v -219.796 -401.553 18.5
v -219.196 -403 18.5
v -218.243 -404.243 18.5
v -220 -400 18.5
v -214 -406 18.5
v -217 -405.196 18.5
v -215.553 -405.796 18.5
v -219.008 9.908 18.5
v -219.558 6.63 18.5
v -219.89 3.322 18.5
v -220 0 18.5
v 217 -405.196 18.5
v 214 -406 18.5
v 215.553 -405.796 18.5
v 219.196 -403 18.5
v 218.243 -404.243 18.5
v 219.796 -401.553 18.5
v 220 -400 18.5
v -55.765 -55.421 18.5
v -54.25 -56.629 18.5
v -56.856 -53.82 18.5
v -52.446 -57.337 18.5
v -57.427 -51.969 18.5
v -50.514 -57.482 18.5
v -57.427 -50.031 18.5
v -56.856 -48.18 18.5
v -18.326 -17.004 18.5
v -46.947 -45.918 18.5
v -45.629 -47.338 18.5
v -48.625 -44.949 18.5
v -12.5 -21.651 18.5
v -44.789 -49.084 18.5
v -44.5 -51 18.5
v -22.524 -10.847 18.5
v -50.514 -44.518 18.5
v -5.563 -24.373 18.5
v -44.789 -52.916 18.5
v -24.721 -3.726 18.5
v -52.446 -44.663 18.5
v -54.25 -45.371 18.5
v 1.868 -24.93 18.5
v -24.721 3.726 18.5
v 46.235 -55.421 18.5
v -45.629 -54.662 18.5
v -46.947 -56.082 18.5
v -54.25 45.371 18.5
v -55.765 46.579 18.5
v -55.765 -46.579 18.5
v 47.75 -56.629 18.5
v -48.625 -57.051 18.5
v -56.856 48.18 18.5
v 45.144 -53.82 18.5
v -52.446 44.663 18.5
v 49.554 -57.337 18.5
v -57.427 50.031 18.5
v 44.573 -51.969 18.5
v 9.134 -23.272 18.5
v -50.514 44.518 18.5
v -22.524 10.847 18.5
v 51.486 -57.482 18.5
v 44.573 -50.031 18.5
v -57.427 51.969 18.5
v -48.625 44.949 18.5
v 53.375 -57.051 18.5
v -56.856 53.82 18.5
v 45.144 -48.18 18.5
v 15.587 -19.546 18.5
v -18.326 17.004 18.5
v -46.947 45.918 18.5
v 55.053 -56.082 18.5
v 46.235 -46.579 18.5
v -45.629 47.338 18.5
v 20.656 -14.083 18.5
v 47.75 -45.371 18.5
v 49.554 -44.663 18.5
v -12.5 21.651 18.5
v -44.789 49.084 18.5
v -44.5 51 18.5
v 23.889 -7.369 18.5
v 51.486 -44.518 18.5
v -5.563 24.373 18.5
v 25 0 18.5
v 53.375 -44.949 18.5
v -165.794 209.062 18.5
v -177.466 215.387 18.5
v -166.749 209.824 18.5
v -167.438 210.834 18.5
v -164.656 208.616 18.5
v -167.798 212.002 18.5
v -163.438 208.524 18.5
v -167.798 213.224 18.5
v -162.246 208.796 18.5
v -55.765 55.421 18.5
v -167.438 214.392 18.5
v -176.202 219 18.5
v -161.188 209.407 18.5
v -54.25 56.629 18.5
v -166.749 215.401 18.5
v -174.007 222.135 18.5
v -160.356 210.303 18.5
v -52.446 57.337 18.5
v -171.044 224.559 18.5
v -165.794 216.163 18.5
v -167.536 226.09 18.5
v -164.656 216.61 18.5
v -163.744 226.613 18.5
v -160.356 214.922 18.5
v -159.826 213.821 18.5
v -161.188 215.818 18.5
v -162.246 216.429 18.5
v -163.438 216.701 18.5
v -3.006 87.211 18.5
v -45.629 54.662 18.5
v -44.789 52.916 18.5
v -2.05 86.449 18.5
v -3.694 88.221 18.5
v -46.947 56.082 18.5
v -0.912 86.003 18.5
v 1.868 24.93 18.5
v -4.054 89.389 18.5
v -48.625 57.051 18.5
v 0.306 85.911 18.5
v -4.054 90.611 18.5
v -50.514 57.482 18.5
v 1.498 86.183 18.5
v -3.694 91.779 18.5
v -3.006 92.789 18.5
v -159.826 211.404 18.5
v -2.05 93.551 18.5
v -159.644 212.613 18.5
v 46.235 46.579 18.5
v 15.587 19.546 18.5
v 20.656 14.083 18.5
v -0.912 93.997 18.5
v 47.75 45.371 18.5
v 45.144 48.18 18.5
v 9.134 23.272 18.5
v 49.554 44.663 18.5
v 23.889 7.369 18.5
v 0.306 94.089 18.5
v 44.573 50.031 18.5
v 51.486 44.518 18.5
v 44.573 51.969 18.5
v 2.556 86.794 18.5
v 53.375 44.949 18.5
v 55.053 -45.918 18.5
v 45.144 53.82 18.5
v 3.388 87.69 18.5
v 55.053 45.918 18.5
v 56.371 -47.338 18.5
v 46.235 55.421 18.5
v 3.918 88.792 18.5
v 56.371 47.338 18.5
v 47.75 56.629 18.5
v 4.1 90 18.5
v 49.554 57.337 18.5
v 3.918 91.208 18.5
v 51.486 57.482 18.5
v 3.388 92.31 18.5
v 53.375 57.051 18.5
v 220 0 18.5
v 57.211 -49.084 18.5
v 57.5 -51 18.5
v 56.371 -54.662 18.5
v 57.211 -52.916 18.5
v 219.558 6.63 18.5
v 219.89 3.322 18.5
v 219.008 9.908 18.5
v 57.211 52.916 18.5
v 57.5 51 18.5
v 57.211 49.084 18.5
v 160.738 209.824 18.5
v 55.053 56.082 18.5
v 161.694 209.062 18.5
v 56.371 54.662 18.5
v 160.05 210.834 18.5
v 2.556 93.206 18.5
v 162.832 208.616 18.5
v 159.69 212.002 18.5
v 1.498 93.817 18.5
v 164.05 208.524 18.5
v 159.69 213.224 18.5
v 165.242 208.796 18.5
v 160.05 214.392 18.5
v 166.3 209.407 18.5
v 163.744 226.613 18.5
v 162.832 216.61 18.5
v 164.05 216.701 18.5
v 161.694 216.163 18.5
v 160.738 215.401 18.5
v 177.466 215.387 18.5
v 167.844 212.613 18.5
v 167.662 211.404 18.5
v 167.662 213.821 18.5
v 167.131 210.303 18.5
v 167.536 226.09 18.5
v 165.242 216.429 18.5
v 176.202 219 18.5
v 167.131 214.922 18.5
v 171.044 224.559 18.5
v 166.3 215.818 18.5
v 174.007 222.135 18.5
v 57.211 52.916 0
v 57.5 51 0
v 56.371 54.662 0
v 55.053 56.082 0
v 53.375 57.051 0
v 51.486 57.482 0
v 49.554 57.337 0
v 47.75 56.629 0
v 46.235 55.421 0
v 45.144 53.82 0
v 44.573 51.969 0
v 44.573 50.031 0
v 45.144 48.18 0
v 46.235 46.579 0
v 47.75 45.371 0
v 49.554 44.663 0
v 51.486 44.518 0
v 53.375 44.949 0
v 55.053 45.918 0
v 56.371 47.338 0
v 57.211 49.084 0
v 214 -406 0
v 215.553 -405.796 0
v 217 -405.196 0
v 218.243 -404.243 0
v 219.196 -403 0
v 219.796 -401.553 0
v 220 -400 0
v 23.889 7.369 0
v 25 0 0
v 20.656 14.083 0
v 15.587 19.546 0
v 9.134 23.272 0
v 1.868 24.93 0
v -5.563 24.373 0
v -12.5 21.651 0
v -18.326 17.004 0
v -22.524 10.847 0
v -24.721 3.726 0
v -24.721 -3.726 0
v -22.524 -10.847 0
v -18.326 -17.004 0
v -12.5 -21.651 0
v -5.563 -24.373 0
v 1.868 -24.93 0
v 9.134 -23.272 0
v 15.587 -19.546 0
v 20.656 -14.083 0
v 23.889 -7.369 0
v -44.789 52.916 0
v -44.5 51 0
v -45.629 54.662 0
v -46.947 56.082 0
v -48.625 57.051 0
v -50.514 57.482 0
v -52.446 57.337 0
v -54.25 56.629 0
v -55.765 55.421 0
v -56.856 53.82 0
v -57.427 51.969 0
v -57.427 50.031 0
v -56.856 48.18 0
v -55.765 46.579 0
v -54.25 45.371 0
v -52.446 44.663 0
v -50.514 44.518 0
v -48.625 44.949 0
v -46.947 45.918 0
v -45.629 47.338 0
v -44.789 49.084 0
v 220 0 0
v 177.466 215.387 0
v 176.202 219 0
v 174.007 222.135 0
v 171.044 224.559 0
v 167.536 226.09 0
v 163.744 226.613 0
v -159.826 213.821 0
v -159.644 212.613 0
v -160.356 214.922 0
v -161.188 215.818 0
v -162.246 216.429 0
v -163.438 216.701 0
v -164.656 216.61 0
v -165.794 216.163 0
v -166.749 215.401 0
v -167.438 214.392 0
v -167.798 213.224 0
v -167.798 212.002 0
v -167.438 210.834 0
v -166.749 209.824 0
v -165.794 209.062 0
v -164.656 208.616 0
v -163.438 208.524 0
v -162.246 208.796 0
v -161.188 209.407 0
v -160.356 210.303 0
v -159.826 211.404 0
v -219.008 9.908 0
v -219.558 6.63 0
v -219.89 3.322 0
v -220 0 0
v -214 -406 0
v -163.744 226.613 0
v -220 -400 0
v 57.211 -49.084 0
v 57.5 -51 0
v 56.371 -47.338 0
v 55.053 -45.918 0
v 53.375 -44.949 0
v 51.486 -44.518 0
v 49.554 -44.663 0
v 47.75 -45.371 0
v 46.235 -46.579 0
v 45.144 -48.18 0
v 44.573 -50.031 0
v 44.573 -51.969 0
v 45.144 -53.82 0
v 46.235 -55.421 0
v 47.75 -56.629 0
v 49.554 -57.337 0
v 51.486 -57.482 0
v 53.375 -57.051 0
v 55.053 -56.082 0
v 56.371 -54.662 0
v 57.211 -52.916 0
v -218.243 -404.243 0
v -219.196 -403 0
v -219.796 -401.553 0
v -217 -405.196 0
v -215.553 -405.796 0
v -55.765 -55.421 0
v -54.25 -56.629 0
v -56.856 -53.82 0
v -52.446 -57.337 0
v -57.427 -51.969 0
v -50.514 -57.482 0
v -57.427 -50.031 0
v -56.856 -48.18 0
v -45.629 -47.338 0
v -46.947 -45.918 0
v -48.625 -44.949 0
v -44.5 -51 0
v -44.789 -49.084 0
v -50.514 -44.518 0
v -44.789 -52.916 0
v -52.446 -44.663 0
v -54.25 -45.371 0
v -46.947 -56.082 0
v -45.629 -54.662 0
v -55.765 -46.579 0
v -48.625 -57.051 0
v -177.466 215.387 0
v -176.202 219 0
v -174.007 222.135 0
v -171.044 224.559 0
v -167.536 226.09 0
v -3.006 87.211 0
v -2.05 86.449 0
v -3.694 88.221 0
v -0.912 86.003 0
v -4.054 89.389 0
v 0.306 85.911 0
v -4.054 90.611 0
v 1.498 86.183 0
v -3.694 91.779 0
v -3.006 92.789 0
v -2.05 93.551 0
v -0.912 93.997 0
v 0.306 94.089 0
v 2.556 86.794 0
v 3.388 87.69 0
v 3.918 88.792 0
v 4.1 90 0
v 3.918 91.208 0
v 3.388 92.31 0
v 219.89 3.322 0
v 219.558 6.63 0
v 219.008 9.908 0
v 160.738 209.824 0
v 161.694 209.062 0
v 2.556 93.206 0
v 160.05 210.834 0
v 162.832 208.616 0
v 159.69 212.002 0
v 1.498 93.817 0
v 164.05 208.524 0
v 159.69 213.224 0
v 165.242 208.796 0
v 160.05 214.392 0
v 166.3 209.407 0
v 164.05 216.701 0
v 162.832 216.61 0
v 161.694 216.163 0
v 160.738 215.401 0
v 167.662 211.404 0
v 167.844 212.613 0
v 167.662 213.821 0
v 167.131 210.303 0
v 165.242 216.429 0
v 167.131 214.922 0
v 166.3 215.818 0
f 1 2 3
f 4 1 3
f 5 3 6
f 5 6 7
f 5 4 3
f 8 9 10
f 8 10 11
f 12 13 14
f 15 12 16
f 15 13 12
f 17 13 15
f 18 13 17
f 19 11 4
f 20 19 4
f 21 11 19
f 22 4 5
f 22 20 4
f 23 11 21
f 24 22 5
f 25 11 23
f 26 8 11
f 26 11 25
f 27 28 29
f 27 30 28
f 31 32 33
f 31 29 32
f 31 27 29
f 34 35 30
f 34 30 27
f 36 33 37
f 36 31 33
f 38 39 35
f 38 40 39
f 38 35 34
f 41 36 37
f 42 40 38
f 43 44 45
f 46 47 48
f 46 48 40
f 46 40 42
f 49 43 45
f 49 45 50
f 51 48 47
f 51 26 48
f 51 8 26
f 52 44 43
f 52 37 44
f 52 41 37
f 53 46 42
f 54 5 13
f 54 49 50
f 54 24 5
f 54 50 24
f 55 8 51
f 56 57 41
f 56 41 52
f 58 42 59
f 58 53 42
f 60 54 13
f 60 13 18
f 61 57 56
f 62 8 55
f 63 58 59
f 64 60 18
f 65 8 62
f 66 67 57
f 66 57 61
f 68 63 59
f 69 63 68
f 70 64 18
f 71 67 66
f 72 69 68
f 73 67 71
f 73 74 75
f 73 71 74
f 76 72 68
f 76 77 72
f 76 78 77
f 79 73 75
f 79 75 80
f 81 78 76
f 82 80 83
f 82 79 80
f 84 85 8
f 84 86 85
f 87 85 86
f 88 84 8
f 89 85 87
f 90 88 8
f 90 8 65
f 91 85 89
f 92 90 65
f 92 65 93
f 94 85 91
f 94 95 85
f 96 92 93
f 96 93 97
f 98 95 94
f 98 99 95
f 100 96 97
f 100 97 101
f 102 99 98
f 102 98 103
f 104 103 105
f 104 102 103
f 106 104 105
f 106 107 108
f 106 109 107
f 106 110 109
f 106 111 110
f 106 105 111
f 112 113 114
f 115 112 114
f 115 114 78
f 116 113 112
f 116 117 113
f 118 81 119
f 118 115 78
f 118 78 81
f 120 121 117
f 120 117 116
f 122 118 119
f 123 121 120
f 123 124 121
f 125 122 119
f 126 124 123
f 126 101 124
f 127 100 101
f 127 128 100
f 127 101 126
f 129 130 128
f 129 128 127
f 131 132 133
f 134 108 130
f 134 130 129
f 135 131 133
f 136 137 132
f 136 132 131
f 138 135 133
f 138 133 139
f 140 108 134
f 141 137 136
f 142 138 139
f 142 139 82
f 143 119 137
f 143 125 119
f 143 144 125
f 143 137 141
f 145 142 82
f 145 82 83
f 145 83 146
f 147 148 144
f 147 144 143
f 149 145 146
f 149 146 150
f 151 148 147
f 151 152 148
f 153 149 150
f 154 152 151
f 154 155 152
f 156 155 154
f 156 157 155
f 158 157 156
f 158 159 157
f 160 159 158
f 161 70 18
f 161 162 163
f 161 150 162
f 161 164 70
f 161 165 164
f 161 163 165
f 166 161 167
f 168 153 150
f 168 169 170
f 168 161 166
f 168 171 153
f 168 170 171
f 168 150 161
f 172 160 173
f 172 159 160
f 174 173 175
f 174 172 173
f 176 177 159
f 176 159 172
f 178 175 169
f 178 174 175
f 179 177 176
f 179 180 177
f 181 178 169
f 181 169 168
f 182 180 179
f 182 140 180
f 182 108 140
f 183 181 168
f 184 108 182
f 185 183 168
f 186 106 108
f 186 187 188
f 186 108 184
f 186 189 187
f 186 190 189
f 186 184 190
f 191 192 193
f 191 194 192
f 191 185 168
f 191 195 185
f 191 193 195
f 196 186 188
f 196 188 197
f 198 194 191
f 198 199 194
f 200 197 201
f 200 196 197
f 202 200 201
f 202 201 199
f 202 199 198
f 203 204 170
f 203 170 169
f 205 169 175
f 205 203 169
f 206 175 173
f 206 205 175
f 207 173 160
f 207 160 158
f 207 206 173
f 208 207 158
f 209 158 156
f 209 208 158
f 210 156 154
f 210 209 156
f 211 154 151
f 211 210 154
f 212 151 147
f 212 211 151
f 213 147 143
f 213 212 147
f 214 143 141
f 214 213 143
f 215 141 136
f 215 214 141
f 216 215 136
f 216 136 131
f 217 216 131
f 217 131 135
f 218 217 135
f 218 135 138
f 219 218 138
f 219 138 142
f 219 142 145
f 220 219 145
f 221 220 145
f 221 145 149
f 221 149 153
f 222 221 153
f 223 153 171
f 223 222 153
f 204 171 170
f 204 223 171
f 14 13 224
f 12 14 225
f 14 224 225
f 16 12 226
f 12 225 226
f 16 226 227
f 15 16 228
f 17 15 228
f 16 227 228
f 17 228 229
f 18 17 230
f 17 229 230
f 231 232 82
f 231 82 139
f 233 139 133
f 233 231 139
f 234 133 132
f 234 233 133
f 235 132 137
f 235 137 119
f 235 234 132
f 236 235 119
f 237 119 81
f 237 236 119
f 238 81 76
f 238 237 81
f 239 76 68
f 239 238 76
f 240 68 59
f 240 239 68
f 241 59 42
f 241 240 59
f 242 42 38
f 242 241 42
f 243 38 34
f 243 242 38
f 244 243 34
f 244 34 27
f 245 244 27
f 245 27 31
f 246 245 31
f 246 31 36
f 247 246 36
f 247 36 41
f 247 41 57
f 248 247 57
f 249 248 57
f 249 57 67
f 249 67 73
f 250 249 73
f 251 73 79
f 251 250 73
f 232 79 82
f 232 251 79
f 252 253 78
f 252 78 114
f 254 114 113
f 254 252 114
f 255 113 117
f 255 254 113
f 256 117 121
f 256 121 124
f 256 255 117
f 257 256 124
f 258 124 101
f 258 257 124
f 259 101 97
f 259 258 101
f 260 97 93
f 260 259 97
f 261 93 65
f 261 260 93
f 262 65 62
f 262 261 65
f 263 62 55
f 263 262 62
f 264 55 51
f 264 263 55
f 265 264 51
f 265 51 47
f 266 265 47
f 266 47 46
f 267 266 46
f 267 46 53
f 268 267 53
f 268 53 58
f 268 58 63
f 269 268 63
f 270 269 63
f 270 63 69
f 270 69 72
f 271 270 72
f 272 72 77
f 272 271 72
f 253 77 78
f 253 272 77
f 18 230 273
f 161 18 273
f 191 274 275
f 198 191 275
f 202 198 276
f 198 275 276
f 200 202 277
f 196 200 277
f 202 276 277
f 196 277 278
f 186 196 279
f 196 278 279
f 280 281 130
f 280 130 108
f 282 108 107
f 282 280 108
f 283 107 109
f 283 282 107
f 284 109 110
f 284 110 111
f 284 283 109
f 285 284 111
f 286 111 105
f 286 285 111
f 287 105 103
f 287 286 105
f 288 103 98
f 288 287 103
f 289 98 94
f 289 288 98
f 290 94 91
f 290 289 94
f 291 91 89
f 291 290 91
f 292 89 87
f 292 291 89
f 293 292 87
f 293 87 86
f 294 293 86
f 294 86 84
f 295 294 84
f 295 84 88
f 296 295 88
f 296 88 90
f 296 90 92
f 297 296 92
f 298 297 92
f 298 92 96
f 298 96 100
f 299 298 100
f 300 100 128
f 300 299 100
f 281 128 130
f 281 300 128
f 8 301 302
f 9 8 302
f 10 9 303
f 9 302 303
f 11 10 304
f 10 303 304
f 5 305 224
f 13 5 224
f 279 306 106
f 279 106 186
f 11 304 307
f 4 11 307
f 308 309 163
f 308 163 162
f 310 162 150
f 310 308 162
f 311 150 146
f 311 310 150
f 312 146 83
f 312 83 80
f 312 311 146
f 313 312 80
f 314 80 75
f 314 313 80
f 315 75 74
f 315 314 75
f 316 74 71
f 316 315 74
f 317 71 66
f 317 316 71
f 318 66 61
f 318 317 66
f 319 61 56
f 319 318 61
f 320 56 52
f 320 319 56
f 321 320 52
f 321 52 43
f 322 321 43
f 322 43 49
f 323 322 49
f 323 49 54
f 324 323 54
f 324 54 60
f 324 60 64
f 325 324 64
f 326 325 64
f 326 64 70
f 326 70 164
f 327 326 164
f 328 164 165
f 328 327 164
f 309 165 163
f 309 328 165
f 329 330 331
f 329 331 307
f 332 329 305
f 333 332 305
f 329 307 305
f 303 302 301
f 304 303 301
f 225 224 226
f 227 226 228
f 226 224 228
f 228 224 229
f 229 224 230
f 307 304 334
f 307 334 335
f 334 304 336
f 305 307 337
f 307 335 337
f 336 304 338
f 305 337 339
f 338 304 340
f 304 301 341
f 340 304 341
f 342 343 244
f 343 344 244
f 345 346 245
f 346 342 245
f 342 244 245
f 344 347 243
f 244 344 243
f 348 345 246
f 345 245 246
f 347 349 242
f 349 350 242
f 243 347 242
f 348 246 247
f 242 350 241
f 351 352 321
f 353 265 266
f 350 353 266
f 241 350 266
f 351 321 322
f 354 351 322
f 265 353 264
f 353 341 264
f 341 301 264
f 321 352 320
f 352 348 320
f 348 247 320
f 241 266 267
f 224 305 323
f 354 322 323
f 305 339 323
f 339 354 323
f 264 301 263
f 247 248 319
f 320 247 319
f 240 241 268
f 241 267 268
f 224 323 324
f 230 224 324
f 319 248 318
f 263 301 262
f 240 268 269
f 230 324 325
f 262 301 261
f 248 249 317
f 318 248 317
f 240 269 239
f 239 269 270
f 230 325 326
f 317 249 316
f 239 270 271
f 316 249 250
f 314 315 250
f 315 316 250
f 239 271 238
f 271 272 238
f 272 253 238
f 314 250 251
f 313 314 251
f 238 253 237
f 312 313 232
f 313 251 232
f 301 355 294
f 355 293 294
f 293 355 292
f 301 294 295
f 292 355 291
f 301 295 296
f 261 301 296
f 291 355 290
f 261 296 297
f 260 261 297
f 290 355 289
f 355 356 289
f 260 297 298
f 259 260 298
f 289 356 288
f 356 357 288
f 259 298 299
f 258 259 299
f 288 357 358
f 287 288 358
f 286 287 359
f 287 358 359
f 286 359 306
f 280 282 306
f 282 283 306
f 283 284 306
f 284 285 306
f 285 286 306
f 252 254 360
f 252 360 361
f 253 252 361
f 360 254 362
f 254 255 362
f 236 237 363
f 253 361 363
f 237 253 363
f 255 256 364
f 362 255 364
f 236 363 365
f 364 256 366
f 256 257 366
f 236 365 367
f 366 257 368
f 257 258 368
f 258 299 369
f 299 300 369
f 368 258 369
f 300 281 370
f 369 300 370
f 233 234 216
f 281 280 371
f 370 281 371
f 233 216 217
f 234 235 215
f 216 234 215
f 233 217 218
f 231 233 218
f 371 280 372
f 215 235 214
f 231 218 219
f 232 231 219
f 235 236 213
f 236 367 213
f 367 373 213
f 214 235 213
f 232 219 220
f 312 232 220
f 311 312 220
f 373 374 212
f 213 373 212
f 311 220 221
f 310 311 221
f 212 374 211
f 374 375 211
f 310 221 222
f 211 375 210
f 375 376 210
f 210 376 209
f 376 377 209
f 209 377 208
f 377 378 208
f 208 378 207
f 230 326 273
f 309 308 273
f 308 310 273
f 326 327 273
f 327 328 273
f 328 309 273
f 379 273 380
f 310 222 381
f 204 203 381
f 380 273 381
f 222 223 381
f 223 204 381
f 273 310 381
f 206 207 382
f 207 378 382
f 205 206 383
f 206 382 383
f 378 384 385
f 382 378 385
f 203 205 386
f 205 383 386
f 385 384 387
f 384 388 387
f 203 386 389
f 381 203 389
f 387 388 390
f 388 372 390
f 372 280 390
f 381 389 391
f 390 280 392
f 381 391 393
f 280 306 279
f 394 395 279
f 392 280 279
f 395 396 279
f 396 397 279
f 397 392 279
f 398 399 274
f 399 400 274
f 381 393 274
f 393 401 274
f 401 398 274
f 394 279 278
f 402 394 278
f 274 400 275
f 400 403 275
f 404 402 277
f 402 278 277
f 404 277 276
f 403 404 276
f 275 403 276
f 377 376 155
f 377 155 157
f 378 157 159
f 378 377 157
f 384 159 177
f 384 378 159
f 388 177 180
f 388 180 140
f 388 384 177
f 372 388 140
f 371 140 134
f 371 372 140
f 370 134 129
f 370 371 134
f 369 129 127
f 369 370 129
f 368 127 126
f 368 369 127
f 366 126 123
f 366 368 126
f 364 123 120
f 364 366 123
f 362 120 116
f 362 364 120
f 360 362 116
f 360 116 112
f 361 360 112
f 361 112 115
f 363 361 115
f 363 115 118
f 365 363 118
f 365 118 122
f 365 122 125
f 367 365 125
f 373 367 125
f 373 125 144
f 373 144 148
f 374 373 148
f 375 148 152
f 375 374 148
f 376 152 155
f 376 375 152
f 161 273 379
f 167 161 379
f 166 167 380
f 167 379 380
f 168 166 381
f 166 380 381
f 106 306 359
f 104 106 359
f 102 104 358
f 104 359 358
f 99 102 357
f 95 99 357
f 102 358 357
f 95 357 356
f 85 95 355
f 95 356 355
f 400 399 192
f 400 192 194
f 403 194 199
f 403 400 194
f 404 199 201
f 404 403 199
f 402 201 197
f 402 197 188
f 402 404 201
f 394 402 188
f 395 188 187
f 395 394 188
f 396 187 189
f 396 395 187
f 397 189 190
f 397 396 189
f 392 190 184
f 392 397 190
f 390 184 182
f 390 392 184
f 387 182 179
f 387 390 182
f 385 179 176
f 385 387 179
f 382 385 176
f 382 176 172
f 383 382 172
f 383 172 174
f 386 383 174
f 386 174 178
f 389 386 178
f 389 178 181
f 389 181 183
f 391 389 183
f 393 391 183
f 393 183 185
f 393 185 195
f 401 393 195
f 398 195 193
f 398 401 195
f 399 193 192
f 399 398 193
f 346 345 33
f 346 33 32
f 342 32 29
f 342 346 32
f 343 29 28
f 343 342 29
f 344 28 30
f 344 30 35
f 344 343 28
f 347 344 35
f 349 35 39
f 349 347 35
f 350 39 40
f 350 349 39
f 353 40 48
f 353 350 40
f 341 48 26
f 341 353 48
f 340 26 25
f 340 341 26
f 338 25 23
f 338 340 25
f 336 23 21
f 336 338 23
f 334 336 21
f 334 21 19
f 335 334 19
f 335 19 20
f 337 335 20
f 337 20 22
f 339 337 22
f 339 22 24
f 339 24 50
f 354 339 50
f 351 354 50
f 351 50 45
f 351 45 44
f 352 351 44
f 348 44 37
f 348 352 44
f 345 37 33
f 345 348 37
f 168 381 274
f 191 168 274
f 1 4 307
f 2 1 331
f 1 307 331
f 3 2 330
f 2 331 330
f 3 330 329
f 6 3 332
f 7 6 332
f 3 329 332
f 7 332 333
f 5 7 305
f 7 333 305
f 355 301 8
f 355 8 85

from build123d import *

# Parameters (mm, degrees)
SKETCH_R   = 25
SKETCH_R_2 = 6.5
SKETCH_R_3 = 4.1
PAD_DEPTH  = 18.5


with BuildPart() as part:
    # Sketch → Pad (new body)
    with BuildSketch(Plane.XY):
        with BuildLine():
            Line((-220, 0), (-220, -400))
            ThreePointArc((-220, -400), (-218.242641, -404.242641), (-214, -406))
            Line((-214, -406), (214, -406))
            ThreePointArc((214, -406), (218.242641, -404.242641), (220, -400))
            Line((220, -400), (220, 0))
            ThreePointArc((220, 0), (219.751495, 4.978826), (219.008452, 9.908162))
            Line((219.008452, 9.908162), (177.466268, 215.387043))
            ThreePointArc((177.466268, 215.387043), (172.608438, 223.448808), (163.743902, 226.612757))
            Line((-163.743902, 226.612757), (163.743902, 226.612757))
            ThreePointArc((-163.743902, 226.612757), (-172.608438, 223.448808), (-177.466268, 215.387043))
            Line((-219.008452, 9.908162), (-177.466268, 215.387043))
            ThreePointArc((-219.008452, 9.908162), (-219.751495, 4.978826), (-220, 0))
        make_face()
        Circle(SKETCH_R, mode=Mode.SUBTRACT)
        with Locations((51, 51)):
            Circle(SKETCH_R_2, mode=Mode.SUBTRACT)
        with Locations((-51, 51)):
            Circle(SKETCH_R_2, mode=Mode.SUBTRACT)
        with Locations((-51, -51)):
            Circle(SKETCH_R_2, mode=Mode.SUBTRACT)
        with Locations((51, -51)):
            Circle(SKETCH_R_2, mode=Mode.SUBTRACT)
        with Locations((0, 90)):
            Circle(SKETCH_R_3, mode=Mode.SUBTRACT)
        with Locations((163.743902, 212.612757)):
            Circle(SKETCH_R_3, mode=Mode.SUBTRACT)
        with Locations((-163.743902, 212.612757)):
            Circle(SKETCH_R_3, mode=Mode.SUBTRACT)
    extrude(amount=PAD_DEPTH)


solid = part.part
